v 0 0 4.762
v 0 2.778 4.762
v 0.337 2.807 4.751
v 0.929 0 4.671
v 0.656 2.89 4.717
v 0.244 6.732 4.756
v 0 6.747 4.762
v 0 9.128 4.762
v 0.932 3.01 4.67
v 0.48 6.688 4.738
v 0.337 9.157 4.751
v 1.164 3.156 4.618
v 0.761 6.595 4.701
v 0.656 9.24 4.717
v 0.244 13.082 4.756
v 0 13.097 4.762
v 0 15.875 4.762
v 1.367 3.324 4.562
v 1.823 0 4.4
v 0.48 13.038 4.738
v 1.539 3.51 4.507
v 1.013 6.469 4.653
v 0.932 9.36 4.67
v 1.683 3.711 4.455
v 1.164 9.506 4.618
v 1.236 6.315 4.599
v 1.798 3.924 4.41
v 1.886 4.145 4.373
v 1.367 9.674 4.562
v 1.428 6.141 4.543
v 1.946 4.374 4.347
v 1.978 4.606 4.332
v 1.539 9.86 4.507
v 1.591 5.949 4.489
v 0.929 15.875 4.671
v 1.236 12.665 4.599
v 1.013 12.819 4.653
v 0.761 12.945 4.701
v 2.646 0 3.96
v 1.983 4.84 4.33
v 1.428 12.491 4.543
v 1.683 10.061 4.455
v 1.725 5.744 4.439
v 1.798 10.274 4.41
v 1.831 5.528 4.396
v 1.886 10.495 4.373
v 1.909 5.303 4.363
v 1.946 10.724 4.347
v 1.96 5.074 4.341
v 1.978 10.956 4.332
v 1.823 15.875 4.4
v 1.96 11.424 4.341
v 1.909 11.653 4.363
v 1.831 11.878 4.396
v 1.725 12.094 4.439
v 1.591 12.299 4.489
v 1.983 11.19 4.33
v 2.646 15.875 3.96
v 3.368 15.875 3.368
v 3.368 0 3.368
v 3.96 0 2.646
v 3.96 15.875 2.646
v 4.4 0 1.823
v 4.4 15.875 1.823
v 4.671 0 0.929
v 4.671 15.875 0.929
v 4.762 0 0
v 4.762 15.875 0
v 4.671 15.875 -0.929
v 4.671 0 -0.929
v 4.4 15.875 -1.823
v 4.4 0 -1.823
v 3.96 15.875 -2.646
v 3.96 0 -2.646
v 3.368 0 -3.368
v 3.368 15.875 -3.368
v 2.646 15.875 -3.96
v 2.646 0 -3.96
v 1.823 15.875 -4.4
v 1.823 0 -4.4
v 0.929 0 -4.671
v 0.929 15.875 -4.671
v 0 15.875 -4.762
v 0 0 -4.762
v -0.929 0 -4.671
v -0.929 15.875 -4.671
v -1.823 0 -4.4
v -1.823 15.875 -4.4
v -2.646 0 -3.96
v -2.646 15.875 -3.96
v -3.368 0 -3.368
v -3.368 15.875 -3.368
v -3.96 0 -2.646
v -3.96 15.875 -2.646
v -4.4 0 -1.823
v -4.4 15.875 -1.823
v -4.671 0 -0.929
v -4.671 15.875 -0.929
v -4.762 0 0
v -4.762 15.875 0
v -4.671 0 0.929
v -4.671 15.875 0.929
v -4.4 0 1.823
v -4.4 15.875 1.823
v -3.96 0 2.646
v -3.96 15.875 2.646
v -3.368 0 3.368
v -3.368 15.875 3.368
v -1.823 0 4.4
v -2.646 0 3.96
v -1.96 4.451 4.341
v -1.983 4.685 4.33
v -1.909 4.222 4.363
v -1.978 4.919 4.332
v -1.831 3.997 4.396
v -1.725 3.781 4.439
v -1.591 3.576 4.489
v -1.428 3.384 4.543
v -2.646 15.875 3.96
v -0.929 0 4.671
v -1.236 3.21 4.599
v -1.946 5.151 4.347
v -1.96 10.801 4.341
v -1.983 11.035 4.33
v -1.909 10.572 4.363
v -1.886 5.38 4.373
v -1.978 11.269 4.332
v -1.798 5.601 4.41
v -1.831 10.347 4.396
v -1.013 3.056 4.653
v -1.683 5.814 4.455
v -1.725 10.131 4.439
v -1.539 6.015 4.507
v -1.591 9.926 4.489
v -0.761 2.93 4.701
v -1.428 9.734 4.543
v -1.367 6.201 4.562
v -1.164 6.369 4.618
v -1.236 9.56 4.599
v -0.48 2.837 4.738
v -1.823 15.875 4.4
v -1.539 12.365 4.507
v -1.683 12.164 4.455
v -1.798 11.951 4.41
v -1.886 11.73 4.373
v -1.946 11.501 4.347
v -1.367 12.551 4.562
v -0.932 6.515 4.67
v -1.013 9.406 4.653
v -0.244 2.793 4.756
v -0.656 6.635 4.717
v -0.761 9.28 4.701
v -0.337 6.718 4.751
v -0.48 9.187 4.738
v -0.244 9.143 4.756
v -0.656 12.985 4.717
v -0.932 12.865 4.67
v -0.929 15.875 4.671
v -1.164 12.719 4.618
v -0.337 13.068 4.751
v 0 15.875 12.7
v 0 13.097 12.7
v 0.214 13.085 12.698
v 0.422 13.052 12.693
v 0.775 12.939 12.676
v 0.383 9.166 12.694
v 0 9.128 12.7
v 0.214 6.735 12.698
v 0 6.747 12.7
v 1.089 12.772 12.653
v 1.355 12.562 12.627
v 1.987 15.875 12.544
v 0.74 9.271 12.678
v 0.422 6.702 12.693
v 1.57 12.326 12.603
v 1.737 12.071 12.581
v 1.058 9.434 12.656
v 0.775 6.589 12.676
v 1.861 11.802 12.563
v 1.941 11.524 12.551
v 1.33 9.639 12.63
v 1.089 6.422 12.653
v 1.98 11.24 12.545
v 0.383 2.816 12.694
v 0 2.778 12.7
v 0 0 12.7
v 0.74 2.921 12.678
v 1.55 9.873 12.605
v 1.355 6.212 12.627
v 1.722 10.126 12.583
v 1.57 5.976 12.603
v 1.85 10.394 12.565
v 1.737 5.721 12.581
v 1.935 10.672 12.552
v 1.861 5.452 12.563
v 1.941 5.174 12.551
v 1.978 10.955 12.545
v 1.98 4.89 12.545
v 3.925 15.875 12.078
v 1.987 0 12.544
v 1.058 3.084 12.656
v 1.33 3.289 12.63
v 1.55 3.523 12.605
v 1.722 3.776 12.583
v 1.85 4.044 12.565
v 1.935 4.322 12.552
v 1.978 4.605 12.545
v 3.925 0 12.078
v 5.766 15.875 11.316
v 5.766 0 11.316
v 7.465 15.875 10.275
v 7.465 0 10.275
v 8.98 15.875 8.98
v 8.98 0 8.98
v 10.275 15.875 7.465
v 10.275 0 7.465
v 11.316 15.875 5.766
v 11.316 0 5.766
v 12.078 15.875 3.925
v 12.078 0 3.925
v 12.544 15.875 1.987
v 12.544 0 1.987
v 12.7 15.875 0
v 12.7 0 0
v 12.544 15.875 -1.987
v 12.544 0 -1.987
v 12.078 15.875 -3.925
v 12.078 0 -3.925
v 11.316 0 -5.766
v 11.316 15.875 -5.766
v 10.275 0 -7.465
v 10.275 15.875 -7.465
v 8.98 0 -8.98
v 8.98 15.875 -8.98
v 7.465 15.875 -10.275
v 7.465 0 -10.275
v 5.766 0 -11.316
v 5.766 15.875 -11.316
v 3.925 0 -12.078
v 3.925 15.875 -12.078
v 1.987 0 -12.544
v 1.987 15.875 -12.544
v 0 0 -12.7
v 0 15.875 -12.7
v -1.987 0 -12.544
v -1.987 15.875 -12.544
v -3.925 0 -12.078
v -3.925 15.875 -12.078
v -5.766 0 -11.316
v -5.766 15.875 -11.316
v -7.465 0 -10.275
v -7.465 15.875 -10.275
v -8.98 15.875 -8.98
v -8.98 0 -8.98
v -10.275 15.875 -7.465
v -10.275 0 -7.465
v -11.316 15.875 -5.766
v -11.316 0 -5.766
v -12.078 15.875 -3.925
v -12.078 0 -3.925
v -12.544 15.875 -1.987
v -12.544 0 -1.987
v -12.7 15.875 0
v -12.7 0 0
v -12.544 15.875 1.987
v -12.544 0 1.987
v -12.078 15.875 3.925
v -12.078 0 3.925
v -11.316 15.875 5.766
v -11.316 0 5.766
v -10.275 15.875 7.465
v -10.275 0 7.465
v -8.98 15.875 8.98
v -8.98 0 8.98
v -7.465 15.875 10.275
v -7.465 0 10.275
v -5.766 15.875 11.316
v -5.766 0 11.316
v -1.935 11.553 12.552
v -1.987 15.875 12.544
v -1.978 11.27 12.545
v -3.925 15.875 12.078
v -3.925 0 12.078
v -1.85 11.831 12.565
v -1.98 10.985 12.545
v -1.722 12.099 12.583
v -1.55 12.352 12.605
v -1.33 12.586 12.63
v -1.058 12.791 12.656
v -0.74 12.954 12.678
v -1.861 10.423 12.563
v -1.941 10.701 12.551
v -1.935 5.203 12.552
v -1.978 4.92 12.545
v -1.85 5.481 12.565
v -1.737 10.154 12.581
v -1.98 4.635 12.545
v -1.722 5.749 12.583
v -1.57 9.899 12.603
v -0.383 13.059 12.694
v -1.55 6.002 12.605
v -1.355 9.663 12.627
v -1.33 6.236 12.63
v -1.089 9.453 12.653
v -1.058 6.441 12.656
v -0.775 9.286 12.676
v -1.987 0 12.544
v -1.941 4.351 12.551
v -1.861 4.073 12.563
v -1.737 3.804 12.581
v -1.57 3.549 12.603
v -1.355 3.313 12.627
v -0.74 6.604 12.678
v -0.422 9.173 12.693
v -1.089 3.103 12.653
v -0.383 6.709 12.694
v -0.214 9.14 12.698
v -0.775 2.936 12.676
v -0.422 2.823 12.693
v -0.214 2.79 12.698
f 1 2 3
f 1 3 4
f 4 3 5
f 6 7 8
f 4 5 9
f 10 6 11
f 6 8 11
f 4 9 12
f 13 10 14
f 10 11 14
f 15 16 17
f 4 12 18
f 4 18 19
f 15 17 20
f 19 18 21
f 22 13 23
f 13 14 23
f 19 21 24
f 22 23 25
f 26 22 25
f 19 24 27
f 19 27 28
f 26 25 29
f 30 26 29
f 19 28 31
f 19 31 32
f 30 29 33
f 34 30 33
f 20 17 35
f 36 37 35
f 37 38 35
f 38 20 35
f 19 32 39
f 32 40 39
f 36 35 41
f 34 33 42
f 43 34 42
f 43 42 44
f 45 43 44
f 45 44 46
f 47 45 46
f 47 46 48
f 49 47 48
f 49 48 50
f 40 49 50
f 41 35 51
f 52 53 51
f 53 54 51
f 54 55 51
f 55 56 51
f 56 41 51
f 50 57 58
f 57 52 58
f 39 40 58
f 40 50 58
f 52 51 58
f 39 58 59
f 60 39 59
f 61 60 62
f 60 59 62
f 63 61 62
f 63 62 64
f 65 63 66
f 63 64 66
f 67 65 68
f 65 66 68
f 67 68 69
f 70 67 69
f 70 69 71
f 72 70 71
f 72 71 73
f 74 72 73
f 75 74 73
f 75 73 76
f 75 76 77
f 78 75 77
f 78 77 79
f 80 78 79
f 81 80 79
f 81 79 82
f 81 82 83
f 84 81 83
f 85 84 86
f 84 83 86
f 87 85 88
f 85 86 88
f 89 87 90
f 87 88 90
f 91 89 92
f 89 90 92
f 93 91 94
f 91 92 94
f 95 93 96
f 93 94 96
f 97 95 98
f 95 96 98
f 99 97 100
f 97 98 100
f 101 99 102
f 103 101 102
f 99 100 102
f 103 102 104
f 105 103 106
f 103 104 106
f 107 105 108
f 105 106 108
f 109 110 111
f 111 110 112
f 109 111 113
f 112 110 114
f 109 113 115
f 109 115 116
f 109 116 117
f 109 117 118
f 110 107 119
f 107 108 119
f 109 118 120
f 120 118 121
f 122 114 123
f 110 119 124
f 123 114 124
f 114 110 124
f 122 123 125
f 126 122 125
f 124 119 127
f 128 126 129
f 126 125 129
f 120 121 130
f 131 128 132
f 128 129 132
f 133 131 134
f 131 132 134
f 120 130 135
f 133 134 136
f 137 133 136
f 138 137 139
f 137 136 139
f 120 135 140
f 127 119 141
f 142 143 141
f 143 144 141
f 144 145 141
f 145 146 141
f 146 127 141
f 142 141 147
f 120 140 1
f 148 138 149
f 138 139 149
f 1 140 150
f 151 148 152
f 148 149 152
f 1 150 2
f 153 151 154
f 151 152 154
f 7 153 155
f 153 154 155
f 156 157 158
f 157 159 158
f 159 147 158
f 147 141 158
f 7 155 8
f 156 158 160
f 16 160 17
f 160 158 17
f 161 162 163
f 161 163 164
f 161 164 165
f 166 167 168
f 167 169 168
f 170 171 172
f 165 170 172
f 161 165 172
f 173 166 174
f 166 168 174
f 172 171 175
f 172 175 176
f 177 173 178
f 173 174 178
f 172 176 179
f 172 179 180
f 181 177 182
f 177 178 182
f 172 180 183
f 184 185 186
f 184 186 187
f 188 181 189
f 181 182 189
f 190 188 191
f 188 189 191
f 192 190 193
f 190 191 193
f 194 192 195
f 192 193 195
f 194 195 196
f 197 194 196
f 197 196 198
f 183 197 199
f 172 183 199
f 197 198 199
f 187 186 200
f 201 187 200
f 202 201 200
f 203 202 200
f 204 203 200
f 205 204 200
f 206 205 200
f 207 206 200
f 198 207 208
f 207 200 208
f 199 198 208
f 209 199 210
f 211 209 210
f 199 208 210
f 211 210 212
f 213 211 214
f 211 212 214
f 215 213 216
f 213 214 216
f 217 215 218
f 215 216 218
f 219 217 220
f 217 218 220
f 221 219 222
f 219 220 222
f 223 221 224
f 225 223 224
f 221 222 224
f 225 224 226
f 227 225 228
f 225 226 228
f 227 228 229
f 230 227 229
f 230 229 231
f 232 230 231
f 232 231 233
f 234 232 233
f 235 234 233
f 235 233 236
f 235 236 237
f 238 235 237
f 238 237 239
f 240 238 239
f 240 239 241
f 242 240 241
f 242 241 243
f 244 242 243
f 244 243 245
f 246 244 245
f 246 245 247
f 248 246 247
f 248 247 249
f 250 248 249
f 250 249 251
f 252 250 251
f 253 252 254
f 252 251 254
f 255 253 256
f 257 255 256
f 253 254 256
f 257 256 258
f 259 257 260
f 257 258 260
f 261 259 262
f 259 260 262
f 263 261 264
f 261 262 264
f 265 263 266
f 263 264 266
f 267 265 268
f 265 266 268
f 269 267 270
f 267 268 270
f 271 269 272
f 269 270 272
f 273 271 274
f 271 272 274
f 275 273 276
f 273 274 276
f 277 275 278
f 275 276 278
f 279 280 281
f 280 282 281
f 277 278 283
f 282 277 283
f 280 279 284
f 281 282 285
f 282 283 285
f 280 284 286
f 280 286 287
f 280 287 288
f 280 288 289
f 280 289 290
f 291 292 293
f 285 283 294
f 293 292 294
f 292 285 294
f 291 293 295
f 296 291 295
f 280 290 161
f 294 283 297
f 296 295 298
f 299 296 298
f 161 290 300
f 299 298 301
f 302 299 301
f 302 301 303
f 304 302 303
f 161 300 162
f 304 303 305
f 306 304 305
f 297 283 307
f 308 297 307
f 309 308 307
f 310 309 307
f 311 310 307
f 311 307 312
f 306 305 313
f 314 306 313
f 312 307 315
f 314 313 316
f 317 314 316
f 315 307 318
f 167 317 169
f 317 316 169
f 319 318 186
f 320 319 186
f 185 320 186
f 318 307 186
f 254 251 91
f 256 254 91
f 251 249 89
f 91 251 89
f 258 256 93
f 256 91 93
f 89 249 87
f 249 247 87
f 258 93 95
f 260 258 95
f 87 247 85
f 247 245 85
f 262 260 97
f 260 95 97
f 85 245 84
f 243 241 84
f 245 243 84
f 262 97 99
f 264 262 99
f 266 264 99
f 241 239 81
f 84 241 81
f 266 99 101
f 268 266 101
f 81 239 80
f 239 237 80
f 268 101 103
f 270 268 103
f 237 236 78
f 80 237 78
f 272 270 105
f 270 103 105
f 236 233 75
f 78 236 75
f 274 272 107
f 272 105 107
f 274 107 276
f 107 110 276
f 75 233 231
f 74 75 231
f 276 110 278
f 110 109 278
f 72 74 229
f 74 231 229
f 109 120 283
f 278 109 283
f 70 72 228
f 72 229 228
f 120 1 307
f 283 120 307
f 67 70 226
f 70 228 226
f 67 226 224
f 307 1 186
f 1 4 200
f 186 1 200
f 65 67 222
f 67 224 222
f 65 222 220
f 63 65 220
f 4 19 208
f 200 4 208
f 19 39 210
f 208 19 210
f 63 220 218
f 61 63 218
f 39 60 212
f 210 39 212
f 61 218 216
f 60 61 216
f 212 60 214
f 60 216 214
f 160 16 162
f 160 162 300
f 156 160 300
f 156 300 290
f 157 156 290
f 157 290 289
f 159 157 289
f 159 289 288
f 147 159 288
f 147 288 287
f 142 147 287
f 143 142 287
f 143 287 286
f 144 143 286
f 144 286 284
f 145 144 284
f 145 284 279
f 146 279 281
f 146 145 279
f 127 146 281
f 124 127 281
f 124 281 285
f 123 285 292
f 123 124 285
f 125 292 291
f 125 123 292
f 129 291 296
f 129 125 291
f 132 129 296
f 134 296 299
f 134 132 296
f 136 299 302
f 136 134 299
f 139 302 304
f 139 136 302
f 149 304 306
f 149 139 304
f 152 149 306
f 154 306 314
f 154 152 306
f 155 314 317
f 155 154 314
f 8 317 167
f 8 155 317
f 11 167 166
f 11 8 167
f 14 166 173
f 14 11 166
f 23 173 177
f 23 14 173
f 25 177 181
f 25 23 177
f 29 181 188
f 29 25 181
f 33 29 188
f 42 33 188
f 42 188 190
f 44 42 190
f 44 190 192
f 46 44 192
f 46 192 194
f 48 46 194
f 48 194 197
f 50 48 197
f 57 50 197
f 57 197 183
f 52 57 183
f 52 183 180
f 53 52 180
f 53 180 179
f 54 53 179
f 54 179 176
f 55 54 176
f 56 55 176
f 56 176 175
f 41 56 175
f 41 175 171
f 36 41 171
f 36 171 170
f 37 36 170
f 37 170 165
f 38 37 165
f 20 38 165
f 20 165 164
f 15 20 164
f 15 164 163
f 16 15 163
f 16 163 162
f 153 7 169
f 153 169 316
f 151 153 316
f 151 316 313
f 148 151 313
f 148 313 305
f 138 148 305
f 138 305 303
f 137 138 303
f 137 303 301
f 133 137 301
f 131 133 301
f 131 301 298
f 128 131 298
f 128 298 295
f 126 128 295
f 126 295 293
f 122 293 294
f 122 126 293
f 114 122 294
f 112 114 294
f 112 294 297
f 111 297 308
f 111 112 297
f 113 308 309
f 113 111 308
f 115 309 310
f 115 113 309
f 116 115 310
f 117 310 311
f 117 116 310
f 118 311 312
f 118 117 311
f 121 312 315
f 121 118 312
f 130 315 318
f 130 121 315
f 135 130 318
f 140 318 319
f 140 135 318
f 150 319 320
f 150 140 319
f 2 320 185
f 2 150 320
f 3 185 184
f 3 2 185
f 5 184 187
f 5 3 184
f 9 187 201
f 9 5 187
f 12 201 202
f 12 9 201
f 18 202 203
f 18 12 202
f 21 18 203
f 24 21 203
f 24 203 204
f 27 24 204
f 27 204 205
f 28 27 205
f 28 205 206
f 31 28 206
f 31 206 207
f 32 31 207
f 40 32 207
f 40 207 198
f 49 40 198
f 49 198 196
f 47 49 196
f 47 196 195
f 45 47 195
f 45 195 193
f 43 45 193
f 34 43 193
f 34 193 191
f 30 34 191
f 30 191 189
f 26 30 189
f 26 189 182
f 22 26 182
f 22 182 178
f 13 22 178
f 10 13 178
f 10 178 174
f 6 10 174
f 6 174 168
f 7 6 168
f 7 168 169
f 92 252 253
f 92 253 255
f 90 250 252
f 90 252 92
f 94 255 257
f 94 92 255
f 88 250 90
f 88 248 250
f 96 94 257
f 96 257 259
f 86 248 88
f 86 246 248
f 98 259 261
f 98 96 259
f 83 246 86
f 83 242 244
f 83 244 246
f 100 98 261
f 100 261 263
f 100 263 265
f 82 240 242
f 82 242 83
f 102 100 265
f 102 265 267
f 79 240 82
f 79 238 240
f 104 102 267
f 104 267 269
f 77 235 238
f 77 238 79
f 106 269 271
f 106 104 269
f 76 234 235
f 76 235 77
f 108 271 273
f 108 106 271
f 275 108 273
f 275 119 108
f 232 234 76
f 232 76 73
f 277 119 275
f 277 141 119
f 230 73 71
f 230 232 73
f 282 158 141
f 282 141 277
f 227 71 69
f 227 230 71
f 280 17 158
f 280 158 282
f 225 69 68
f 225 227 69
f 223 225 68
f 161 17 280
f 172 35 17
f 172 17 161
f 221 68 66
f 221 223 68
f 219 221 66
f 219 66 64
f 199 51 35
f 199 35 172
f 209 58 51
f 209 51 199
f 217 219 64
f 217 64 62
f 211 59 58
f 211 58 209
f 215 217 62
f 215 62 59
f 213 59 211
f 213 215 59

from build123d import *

# Parameters (mm, degrees)
SKETCH1_R           = 12.7
BOSS_EXTRUDE1_DEPTH = 15.875
SKETCH2_R           = 4.7625
CUT_EXTRUDE1_DEPTH  = 24.970724332
SKETCH3_R           = 1.984375
CUT_EXTRUDE2_DEPTH  = 24.970724332


with BuildPart() as part:
    # Sketch1 → Boss-Extrude1 (new body)
    with BuildSketch(Plane(origin=(0, 0, 0), x_dir=(1, 0, 0), z_dir=(0, 1, 0))):
        with Locations(Location((0, 0, 0), (0, 0, 270))):
            Circle(SKETCH1_R)
    extrude(amount=BOSS_EXTRUDE1_DEPTH)

    # Sketch2 → Cut-Extrude1 (cut, through all)
    with BuildSketch(Plane(origin=(0, 15.875, 0), x_dir=(1, 0, 0), z_dir=(0, 1, 0))):
        with Locations(Location((0, 0, 0), (0, 0, 270))):
            Circle(SKETCH2_R)
    extrude(amount=-CUT_EXTRUDE1_DEPTH, mode=Mode.SUBTRACT)

    # Sketch3 → Cut-Extrude2 (cut, through all)
    with BuildSketch(Plane.XY):
        with Locations(Location((0, 4.7625, 0), (0, 0, 90.000000002))):
            Circle(SKETCH3_R)
        with Locations(Location((0, 11.1125, 0), (0, 0, 90.000000002))):
            Circle(SKETCH3_R)
    extrude(amount=CUT_EXTRUDE2_DEPTH, mode=Mode.SUBTRACT)


solid = part.part
